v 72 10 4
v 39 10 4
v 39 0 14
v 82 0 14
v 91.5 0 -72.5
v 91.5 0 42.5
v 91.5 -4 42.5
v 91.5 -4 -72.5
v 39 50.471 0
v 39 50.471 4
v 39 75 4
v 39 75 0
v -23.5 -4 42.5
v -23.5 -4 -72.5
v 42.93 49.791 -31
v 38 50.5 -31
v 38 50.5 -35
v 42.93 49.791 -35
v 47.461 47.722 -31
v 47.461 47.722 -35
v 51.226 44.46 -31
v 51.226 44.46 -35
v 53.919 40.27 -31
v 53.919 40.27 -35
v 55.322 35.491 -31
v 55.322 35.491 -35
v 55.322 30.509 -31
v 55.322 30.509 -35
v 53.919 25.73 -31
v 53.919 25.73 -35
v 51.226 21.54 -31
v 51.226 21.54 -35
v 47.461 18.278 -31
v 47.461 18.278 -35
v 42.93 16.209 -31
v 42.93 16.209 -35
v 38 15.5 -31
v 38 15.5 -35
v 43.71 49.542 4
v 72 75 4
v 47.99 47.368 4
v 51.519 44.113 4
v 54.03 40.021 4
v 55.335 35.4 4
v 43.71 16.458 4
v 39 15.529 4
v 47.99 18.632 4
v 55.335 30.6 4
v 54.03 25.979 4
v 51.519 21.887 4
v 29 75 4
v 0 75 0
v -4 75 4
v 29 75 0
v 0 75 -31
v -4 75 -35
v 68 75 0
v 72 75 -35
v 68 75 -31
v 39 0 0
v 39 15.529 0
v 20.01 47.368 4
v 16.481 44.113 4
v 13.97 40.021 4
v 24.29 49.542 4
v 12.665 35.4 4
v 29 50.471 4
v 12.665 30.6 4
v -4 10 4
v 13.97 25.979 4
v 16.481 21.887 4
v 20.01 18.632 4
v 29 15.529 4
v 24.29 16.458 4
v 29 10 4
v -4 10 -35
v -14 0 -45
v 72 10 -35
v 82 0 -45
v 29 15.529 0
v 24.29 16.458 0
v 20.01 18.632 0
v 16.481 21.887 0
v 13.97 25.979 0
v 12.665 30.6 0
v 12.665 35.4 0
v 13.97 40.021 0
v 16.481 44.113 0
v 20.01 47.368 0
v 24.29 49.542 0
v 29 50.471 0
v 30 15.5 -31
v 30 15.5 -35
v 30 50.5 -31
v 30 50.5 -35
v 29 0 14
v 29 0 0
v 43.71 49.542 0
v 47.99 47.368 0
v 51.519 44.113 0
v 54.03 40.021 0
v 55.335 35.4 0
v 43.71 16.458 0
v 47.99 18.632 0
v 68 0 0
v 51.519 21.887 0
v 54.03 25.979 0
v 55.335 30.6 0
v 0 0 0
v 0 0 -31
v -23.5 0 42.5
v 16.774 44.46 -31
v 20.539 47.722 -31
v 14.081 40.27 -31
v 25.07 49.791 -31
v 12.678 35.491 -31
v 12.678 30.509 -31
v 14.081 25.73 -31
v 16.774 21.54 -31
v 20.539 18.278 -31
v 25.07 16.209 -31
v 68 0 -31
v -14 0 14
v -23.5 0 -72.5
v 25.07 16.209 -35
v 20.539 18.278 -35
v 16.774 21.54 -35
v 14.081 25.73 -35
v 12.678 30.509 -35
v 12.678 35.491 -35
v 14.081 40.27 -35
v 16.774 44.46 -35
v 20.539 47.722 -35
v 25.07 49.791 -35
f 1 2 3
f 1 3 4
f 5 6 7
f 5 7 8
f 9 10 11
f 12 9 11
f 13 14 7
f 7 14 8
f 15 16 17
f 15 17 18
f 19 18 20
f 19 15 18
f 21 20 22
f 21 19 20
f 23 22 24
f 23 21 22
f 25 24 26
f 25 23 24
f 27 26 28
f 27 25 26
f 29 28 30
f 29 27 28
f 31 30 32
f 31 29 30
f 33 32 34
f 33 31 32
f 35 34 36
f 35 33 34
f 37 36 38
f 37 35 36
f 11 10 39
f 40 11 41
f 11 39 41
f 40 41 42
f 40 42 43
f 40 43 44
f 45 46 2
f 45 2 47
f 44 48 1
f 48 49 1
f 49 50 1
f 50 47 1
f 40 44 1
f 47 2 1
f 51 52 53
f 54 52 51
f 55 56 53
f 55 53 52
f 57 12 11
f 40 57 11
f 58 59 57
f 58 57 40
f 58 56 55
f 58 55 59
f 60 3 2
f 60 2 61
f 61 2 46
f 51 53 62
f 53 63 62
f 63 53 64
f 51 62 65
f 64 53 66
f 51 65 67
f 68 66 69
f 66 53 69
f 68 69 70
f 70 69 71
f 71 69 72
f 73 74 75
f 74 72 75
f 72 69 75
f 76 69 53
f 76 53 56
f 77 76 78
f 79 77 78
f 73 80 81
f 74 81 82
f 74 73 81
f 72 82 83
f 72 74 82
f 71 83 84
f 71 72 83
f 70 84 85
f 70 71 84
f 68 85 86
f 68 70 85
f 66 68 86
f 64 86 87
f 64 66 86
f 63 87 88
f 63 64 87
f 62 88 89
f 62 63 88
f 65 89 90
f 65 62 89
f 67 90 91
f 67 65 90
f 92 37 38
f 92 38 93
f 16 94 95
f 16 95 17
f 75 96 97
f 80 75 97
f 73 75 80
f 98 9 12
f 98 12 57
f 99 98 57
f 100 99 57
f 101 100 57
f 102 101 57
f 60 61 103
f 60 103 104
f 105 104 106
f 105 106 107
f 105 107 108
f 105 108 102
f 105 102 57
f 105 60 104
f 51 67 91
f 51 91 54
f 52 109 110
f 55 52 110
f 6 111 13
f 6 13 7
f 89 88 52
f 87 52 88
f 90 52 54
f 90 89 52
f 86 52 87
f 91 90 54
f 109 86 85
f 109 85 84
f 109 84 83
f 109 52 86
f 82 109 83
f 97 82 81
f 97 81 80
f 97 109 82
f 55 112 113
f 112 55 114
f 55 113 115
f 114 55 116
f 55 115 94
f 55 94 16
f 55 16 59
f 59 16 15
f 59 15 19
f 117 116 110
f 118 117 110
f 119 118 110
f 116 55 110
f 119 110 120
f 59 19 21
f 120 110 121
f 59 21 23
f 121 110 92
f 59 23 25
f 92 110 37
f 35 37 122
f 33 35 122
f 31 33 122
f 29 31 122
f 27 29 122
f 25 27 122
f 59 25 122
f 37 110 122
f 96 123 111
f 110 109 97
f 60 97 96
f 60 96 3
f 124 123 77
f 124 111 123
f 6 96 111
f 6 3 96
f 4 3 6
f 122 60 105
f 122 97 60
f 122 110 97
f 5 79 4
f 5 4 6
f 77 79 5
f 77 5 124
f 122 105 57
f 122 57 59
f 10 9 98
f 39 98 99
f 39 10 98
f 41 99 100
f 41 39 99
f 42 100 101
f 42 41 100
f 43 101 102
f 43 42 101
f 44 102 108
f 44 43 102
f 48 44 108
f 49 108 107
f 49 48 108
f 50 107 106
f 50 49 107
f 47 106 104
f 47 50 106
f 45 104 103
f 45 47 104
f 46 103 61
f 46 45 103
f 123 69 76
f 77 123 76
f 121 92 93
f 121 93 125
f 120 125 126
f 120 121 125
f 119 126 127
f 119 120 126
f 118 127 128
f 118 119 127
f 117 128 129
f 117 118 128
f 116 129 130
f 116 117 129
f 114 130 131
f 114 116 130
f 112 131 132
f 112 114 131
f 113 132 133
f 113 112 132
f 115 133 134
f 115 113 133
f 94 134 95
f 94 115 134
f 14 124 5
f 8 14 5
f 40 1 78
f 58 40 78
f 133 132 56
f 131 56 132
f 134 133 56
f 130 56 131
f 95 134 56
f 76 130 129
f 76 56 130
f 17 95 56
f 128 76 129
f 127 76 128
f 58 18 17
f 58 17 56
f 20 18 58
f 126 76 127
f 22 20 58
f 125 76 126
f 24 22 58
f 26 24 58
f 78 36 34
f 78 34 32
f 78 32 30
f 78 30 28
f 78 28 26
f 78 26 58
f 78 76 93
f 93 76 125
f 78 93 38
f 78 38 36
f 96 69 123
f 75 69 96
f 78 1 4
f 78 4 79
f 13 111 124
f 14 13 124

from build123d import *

# Parameters (mm, degrees)
SKETCH1_W           = 76
SKETCH1_H           = 39
SKETCH1_W_2         = 68
SKETCH1_H_2         = 31
BOSS_EXTRUDE2_DEPTH = 75
SKETCH1_9_W         = 115
SKETCH1_9_H         = 115
BOSS_EXTRUDE6_DEPTH = 4
SKETCH9_W           = 10
SKETCH9_H           = 75
CUT_EXTRUDE2_DEPTH  = 6
CUT_EXTRUDE3_DEPTH  = 52
CHAMFER1_SIZE       = 10


with BuildPart() as part:
    # Sketch1 → Boss-Extrude2 (new body)
    with BuildSketch(Plane(origin=(0, 0, 0), x_dir=(1, 0, 0), z_dir=(0, 1, 0))):
        with Locations((34, 15.5)):
            Rectangle(SKETCH1_W, SKETCH1_H)
        with Locations((34, 15.5)):
            Rectangle(SKETCH1_W_2, SKETCH1_H_2, mode=Mode.SUBTRACT)
    extrude(amount=BOSS_EXTRUDE2_DEPTH)

    # Sketch1<9> → Boss-Extrude6 (add)
    with BuildSketch(Plane(origin=(0, 0, 0), x_dir=(1, 0, 0), z_dir=(0, 1, 0))):
        with Locations((34, 15)):
            Rectangle(SKETCH1_9_W, SKETCH1_9_H)
    extrude(amount=-BOSS_EXTRUDE6_DEPTH)

    # Sketch9 → Cut-Extrude2 (cut)
    with BuildSketch(Plane.XY.offset(4)):
        with Locations((34, 37.5)):
            Rectangle(SKETCH9_W, SKETCH9_H)
    extrude(amount=-CUT_EXTRUDE2_DEPTH, mode=Mode.SUBTRACT)

    # Sketch7 → Cut-Extrude3 (cut)
    with BuildSketch(Plane.XY.offset(4)):
        with BuildLine():
            Line((30, 50.5), (38, 50.5))
            ThreePointArc((38, 50.5), (55.5, 33), (38, 15.5))
            Line((38, 15.5), (30, 15.5))
            ThreePointArc((30, 15.5), (12.5, 33), (30, 50.5))
        make_face()
    extrude(amount=-CUT_EXTRUDE3_DEPTH, mode=Mode.SUBTRACT)

    # Chamfer1
    chamfer1_edges = [part.edges().sort_by_distance(p)[0] for p in [
        (12.5, 0, 4),
        (-4, 0, -15.5),
        (55.5, 0, 4),
        (72, 0, -15.5),
        (34, 0, -35),
    ]]
    chamfer(chamfer1_edges, length=CHAMFER1_SIZE)


solid = part.part
